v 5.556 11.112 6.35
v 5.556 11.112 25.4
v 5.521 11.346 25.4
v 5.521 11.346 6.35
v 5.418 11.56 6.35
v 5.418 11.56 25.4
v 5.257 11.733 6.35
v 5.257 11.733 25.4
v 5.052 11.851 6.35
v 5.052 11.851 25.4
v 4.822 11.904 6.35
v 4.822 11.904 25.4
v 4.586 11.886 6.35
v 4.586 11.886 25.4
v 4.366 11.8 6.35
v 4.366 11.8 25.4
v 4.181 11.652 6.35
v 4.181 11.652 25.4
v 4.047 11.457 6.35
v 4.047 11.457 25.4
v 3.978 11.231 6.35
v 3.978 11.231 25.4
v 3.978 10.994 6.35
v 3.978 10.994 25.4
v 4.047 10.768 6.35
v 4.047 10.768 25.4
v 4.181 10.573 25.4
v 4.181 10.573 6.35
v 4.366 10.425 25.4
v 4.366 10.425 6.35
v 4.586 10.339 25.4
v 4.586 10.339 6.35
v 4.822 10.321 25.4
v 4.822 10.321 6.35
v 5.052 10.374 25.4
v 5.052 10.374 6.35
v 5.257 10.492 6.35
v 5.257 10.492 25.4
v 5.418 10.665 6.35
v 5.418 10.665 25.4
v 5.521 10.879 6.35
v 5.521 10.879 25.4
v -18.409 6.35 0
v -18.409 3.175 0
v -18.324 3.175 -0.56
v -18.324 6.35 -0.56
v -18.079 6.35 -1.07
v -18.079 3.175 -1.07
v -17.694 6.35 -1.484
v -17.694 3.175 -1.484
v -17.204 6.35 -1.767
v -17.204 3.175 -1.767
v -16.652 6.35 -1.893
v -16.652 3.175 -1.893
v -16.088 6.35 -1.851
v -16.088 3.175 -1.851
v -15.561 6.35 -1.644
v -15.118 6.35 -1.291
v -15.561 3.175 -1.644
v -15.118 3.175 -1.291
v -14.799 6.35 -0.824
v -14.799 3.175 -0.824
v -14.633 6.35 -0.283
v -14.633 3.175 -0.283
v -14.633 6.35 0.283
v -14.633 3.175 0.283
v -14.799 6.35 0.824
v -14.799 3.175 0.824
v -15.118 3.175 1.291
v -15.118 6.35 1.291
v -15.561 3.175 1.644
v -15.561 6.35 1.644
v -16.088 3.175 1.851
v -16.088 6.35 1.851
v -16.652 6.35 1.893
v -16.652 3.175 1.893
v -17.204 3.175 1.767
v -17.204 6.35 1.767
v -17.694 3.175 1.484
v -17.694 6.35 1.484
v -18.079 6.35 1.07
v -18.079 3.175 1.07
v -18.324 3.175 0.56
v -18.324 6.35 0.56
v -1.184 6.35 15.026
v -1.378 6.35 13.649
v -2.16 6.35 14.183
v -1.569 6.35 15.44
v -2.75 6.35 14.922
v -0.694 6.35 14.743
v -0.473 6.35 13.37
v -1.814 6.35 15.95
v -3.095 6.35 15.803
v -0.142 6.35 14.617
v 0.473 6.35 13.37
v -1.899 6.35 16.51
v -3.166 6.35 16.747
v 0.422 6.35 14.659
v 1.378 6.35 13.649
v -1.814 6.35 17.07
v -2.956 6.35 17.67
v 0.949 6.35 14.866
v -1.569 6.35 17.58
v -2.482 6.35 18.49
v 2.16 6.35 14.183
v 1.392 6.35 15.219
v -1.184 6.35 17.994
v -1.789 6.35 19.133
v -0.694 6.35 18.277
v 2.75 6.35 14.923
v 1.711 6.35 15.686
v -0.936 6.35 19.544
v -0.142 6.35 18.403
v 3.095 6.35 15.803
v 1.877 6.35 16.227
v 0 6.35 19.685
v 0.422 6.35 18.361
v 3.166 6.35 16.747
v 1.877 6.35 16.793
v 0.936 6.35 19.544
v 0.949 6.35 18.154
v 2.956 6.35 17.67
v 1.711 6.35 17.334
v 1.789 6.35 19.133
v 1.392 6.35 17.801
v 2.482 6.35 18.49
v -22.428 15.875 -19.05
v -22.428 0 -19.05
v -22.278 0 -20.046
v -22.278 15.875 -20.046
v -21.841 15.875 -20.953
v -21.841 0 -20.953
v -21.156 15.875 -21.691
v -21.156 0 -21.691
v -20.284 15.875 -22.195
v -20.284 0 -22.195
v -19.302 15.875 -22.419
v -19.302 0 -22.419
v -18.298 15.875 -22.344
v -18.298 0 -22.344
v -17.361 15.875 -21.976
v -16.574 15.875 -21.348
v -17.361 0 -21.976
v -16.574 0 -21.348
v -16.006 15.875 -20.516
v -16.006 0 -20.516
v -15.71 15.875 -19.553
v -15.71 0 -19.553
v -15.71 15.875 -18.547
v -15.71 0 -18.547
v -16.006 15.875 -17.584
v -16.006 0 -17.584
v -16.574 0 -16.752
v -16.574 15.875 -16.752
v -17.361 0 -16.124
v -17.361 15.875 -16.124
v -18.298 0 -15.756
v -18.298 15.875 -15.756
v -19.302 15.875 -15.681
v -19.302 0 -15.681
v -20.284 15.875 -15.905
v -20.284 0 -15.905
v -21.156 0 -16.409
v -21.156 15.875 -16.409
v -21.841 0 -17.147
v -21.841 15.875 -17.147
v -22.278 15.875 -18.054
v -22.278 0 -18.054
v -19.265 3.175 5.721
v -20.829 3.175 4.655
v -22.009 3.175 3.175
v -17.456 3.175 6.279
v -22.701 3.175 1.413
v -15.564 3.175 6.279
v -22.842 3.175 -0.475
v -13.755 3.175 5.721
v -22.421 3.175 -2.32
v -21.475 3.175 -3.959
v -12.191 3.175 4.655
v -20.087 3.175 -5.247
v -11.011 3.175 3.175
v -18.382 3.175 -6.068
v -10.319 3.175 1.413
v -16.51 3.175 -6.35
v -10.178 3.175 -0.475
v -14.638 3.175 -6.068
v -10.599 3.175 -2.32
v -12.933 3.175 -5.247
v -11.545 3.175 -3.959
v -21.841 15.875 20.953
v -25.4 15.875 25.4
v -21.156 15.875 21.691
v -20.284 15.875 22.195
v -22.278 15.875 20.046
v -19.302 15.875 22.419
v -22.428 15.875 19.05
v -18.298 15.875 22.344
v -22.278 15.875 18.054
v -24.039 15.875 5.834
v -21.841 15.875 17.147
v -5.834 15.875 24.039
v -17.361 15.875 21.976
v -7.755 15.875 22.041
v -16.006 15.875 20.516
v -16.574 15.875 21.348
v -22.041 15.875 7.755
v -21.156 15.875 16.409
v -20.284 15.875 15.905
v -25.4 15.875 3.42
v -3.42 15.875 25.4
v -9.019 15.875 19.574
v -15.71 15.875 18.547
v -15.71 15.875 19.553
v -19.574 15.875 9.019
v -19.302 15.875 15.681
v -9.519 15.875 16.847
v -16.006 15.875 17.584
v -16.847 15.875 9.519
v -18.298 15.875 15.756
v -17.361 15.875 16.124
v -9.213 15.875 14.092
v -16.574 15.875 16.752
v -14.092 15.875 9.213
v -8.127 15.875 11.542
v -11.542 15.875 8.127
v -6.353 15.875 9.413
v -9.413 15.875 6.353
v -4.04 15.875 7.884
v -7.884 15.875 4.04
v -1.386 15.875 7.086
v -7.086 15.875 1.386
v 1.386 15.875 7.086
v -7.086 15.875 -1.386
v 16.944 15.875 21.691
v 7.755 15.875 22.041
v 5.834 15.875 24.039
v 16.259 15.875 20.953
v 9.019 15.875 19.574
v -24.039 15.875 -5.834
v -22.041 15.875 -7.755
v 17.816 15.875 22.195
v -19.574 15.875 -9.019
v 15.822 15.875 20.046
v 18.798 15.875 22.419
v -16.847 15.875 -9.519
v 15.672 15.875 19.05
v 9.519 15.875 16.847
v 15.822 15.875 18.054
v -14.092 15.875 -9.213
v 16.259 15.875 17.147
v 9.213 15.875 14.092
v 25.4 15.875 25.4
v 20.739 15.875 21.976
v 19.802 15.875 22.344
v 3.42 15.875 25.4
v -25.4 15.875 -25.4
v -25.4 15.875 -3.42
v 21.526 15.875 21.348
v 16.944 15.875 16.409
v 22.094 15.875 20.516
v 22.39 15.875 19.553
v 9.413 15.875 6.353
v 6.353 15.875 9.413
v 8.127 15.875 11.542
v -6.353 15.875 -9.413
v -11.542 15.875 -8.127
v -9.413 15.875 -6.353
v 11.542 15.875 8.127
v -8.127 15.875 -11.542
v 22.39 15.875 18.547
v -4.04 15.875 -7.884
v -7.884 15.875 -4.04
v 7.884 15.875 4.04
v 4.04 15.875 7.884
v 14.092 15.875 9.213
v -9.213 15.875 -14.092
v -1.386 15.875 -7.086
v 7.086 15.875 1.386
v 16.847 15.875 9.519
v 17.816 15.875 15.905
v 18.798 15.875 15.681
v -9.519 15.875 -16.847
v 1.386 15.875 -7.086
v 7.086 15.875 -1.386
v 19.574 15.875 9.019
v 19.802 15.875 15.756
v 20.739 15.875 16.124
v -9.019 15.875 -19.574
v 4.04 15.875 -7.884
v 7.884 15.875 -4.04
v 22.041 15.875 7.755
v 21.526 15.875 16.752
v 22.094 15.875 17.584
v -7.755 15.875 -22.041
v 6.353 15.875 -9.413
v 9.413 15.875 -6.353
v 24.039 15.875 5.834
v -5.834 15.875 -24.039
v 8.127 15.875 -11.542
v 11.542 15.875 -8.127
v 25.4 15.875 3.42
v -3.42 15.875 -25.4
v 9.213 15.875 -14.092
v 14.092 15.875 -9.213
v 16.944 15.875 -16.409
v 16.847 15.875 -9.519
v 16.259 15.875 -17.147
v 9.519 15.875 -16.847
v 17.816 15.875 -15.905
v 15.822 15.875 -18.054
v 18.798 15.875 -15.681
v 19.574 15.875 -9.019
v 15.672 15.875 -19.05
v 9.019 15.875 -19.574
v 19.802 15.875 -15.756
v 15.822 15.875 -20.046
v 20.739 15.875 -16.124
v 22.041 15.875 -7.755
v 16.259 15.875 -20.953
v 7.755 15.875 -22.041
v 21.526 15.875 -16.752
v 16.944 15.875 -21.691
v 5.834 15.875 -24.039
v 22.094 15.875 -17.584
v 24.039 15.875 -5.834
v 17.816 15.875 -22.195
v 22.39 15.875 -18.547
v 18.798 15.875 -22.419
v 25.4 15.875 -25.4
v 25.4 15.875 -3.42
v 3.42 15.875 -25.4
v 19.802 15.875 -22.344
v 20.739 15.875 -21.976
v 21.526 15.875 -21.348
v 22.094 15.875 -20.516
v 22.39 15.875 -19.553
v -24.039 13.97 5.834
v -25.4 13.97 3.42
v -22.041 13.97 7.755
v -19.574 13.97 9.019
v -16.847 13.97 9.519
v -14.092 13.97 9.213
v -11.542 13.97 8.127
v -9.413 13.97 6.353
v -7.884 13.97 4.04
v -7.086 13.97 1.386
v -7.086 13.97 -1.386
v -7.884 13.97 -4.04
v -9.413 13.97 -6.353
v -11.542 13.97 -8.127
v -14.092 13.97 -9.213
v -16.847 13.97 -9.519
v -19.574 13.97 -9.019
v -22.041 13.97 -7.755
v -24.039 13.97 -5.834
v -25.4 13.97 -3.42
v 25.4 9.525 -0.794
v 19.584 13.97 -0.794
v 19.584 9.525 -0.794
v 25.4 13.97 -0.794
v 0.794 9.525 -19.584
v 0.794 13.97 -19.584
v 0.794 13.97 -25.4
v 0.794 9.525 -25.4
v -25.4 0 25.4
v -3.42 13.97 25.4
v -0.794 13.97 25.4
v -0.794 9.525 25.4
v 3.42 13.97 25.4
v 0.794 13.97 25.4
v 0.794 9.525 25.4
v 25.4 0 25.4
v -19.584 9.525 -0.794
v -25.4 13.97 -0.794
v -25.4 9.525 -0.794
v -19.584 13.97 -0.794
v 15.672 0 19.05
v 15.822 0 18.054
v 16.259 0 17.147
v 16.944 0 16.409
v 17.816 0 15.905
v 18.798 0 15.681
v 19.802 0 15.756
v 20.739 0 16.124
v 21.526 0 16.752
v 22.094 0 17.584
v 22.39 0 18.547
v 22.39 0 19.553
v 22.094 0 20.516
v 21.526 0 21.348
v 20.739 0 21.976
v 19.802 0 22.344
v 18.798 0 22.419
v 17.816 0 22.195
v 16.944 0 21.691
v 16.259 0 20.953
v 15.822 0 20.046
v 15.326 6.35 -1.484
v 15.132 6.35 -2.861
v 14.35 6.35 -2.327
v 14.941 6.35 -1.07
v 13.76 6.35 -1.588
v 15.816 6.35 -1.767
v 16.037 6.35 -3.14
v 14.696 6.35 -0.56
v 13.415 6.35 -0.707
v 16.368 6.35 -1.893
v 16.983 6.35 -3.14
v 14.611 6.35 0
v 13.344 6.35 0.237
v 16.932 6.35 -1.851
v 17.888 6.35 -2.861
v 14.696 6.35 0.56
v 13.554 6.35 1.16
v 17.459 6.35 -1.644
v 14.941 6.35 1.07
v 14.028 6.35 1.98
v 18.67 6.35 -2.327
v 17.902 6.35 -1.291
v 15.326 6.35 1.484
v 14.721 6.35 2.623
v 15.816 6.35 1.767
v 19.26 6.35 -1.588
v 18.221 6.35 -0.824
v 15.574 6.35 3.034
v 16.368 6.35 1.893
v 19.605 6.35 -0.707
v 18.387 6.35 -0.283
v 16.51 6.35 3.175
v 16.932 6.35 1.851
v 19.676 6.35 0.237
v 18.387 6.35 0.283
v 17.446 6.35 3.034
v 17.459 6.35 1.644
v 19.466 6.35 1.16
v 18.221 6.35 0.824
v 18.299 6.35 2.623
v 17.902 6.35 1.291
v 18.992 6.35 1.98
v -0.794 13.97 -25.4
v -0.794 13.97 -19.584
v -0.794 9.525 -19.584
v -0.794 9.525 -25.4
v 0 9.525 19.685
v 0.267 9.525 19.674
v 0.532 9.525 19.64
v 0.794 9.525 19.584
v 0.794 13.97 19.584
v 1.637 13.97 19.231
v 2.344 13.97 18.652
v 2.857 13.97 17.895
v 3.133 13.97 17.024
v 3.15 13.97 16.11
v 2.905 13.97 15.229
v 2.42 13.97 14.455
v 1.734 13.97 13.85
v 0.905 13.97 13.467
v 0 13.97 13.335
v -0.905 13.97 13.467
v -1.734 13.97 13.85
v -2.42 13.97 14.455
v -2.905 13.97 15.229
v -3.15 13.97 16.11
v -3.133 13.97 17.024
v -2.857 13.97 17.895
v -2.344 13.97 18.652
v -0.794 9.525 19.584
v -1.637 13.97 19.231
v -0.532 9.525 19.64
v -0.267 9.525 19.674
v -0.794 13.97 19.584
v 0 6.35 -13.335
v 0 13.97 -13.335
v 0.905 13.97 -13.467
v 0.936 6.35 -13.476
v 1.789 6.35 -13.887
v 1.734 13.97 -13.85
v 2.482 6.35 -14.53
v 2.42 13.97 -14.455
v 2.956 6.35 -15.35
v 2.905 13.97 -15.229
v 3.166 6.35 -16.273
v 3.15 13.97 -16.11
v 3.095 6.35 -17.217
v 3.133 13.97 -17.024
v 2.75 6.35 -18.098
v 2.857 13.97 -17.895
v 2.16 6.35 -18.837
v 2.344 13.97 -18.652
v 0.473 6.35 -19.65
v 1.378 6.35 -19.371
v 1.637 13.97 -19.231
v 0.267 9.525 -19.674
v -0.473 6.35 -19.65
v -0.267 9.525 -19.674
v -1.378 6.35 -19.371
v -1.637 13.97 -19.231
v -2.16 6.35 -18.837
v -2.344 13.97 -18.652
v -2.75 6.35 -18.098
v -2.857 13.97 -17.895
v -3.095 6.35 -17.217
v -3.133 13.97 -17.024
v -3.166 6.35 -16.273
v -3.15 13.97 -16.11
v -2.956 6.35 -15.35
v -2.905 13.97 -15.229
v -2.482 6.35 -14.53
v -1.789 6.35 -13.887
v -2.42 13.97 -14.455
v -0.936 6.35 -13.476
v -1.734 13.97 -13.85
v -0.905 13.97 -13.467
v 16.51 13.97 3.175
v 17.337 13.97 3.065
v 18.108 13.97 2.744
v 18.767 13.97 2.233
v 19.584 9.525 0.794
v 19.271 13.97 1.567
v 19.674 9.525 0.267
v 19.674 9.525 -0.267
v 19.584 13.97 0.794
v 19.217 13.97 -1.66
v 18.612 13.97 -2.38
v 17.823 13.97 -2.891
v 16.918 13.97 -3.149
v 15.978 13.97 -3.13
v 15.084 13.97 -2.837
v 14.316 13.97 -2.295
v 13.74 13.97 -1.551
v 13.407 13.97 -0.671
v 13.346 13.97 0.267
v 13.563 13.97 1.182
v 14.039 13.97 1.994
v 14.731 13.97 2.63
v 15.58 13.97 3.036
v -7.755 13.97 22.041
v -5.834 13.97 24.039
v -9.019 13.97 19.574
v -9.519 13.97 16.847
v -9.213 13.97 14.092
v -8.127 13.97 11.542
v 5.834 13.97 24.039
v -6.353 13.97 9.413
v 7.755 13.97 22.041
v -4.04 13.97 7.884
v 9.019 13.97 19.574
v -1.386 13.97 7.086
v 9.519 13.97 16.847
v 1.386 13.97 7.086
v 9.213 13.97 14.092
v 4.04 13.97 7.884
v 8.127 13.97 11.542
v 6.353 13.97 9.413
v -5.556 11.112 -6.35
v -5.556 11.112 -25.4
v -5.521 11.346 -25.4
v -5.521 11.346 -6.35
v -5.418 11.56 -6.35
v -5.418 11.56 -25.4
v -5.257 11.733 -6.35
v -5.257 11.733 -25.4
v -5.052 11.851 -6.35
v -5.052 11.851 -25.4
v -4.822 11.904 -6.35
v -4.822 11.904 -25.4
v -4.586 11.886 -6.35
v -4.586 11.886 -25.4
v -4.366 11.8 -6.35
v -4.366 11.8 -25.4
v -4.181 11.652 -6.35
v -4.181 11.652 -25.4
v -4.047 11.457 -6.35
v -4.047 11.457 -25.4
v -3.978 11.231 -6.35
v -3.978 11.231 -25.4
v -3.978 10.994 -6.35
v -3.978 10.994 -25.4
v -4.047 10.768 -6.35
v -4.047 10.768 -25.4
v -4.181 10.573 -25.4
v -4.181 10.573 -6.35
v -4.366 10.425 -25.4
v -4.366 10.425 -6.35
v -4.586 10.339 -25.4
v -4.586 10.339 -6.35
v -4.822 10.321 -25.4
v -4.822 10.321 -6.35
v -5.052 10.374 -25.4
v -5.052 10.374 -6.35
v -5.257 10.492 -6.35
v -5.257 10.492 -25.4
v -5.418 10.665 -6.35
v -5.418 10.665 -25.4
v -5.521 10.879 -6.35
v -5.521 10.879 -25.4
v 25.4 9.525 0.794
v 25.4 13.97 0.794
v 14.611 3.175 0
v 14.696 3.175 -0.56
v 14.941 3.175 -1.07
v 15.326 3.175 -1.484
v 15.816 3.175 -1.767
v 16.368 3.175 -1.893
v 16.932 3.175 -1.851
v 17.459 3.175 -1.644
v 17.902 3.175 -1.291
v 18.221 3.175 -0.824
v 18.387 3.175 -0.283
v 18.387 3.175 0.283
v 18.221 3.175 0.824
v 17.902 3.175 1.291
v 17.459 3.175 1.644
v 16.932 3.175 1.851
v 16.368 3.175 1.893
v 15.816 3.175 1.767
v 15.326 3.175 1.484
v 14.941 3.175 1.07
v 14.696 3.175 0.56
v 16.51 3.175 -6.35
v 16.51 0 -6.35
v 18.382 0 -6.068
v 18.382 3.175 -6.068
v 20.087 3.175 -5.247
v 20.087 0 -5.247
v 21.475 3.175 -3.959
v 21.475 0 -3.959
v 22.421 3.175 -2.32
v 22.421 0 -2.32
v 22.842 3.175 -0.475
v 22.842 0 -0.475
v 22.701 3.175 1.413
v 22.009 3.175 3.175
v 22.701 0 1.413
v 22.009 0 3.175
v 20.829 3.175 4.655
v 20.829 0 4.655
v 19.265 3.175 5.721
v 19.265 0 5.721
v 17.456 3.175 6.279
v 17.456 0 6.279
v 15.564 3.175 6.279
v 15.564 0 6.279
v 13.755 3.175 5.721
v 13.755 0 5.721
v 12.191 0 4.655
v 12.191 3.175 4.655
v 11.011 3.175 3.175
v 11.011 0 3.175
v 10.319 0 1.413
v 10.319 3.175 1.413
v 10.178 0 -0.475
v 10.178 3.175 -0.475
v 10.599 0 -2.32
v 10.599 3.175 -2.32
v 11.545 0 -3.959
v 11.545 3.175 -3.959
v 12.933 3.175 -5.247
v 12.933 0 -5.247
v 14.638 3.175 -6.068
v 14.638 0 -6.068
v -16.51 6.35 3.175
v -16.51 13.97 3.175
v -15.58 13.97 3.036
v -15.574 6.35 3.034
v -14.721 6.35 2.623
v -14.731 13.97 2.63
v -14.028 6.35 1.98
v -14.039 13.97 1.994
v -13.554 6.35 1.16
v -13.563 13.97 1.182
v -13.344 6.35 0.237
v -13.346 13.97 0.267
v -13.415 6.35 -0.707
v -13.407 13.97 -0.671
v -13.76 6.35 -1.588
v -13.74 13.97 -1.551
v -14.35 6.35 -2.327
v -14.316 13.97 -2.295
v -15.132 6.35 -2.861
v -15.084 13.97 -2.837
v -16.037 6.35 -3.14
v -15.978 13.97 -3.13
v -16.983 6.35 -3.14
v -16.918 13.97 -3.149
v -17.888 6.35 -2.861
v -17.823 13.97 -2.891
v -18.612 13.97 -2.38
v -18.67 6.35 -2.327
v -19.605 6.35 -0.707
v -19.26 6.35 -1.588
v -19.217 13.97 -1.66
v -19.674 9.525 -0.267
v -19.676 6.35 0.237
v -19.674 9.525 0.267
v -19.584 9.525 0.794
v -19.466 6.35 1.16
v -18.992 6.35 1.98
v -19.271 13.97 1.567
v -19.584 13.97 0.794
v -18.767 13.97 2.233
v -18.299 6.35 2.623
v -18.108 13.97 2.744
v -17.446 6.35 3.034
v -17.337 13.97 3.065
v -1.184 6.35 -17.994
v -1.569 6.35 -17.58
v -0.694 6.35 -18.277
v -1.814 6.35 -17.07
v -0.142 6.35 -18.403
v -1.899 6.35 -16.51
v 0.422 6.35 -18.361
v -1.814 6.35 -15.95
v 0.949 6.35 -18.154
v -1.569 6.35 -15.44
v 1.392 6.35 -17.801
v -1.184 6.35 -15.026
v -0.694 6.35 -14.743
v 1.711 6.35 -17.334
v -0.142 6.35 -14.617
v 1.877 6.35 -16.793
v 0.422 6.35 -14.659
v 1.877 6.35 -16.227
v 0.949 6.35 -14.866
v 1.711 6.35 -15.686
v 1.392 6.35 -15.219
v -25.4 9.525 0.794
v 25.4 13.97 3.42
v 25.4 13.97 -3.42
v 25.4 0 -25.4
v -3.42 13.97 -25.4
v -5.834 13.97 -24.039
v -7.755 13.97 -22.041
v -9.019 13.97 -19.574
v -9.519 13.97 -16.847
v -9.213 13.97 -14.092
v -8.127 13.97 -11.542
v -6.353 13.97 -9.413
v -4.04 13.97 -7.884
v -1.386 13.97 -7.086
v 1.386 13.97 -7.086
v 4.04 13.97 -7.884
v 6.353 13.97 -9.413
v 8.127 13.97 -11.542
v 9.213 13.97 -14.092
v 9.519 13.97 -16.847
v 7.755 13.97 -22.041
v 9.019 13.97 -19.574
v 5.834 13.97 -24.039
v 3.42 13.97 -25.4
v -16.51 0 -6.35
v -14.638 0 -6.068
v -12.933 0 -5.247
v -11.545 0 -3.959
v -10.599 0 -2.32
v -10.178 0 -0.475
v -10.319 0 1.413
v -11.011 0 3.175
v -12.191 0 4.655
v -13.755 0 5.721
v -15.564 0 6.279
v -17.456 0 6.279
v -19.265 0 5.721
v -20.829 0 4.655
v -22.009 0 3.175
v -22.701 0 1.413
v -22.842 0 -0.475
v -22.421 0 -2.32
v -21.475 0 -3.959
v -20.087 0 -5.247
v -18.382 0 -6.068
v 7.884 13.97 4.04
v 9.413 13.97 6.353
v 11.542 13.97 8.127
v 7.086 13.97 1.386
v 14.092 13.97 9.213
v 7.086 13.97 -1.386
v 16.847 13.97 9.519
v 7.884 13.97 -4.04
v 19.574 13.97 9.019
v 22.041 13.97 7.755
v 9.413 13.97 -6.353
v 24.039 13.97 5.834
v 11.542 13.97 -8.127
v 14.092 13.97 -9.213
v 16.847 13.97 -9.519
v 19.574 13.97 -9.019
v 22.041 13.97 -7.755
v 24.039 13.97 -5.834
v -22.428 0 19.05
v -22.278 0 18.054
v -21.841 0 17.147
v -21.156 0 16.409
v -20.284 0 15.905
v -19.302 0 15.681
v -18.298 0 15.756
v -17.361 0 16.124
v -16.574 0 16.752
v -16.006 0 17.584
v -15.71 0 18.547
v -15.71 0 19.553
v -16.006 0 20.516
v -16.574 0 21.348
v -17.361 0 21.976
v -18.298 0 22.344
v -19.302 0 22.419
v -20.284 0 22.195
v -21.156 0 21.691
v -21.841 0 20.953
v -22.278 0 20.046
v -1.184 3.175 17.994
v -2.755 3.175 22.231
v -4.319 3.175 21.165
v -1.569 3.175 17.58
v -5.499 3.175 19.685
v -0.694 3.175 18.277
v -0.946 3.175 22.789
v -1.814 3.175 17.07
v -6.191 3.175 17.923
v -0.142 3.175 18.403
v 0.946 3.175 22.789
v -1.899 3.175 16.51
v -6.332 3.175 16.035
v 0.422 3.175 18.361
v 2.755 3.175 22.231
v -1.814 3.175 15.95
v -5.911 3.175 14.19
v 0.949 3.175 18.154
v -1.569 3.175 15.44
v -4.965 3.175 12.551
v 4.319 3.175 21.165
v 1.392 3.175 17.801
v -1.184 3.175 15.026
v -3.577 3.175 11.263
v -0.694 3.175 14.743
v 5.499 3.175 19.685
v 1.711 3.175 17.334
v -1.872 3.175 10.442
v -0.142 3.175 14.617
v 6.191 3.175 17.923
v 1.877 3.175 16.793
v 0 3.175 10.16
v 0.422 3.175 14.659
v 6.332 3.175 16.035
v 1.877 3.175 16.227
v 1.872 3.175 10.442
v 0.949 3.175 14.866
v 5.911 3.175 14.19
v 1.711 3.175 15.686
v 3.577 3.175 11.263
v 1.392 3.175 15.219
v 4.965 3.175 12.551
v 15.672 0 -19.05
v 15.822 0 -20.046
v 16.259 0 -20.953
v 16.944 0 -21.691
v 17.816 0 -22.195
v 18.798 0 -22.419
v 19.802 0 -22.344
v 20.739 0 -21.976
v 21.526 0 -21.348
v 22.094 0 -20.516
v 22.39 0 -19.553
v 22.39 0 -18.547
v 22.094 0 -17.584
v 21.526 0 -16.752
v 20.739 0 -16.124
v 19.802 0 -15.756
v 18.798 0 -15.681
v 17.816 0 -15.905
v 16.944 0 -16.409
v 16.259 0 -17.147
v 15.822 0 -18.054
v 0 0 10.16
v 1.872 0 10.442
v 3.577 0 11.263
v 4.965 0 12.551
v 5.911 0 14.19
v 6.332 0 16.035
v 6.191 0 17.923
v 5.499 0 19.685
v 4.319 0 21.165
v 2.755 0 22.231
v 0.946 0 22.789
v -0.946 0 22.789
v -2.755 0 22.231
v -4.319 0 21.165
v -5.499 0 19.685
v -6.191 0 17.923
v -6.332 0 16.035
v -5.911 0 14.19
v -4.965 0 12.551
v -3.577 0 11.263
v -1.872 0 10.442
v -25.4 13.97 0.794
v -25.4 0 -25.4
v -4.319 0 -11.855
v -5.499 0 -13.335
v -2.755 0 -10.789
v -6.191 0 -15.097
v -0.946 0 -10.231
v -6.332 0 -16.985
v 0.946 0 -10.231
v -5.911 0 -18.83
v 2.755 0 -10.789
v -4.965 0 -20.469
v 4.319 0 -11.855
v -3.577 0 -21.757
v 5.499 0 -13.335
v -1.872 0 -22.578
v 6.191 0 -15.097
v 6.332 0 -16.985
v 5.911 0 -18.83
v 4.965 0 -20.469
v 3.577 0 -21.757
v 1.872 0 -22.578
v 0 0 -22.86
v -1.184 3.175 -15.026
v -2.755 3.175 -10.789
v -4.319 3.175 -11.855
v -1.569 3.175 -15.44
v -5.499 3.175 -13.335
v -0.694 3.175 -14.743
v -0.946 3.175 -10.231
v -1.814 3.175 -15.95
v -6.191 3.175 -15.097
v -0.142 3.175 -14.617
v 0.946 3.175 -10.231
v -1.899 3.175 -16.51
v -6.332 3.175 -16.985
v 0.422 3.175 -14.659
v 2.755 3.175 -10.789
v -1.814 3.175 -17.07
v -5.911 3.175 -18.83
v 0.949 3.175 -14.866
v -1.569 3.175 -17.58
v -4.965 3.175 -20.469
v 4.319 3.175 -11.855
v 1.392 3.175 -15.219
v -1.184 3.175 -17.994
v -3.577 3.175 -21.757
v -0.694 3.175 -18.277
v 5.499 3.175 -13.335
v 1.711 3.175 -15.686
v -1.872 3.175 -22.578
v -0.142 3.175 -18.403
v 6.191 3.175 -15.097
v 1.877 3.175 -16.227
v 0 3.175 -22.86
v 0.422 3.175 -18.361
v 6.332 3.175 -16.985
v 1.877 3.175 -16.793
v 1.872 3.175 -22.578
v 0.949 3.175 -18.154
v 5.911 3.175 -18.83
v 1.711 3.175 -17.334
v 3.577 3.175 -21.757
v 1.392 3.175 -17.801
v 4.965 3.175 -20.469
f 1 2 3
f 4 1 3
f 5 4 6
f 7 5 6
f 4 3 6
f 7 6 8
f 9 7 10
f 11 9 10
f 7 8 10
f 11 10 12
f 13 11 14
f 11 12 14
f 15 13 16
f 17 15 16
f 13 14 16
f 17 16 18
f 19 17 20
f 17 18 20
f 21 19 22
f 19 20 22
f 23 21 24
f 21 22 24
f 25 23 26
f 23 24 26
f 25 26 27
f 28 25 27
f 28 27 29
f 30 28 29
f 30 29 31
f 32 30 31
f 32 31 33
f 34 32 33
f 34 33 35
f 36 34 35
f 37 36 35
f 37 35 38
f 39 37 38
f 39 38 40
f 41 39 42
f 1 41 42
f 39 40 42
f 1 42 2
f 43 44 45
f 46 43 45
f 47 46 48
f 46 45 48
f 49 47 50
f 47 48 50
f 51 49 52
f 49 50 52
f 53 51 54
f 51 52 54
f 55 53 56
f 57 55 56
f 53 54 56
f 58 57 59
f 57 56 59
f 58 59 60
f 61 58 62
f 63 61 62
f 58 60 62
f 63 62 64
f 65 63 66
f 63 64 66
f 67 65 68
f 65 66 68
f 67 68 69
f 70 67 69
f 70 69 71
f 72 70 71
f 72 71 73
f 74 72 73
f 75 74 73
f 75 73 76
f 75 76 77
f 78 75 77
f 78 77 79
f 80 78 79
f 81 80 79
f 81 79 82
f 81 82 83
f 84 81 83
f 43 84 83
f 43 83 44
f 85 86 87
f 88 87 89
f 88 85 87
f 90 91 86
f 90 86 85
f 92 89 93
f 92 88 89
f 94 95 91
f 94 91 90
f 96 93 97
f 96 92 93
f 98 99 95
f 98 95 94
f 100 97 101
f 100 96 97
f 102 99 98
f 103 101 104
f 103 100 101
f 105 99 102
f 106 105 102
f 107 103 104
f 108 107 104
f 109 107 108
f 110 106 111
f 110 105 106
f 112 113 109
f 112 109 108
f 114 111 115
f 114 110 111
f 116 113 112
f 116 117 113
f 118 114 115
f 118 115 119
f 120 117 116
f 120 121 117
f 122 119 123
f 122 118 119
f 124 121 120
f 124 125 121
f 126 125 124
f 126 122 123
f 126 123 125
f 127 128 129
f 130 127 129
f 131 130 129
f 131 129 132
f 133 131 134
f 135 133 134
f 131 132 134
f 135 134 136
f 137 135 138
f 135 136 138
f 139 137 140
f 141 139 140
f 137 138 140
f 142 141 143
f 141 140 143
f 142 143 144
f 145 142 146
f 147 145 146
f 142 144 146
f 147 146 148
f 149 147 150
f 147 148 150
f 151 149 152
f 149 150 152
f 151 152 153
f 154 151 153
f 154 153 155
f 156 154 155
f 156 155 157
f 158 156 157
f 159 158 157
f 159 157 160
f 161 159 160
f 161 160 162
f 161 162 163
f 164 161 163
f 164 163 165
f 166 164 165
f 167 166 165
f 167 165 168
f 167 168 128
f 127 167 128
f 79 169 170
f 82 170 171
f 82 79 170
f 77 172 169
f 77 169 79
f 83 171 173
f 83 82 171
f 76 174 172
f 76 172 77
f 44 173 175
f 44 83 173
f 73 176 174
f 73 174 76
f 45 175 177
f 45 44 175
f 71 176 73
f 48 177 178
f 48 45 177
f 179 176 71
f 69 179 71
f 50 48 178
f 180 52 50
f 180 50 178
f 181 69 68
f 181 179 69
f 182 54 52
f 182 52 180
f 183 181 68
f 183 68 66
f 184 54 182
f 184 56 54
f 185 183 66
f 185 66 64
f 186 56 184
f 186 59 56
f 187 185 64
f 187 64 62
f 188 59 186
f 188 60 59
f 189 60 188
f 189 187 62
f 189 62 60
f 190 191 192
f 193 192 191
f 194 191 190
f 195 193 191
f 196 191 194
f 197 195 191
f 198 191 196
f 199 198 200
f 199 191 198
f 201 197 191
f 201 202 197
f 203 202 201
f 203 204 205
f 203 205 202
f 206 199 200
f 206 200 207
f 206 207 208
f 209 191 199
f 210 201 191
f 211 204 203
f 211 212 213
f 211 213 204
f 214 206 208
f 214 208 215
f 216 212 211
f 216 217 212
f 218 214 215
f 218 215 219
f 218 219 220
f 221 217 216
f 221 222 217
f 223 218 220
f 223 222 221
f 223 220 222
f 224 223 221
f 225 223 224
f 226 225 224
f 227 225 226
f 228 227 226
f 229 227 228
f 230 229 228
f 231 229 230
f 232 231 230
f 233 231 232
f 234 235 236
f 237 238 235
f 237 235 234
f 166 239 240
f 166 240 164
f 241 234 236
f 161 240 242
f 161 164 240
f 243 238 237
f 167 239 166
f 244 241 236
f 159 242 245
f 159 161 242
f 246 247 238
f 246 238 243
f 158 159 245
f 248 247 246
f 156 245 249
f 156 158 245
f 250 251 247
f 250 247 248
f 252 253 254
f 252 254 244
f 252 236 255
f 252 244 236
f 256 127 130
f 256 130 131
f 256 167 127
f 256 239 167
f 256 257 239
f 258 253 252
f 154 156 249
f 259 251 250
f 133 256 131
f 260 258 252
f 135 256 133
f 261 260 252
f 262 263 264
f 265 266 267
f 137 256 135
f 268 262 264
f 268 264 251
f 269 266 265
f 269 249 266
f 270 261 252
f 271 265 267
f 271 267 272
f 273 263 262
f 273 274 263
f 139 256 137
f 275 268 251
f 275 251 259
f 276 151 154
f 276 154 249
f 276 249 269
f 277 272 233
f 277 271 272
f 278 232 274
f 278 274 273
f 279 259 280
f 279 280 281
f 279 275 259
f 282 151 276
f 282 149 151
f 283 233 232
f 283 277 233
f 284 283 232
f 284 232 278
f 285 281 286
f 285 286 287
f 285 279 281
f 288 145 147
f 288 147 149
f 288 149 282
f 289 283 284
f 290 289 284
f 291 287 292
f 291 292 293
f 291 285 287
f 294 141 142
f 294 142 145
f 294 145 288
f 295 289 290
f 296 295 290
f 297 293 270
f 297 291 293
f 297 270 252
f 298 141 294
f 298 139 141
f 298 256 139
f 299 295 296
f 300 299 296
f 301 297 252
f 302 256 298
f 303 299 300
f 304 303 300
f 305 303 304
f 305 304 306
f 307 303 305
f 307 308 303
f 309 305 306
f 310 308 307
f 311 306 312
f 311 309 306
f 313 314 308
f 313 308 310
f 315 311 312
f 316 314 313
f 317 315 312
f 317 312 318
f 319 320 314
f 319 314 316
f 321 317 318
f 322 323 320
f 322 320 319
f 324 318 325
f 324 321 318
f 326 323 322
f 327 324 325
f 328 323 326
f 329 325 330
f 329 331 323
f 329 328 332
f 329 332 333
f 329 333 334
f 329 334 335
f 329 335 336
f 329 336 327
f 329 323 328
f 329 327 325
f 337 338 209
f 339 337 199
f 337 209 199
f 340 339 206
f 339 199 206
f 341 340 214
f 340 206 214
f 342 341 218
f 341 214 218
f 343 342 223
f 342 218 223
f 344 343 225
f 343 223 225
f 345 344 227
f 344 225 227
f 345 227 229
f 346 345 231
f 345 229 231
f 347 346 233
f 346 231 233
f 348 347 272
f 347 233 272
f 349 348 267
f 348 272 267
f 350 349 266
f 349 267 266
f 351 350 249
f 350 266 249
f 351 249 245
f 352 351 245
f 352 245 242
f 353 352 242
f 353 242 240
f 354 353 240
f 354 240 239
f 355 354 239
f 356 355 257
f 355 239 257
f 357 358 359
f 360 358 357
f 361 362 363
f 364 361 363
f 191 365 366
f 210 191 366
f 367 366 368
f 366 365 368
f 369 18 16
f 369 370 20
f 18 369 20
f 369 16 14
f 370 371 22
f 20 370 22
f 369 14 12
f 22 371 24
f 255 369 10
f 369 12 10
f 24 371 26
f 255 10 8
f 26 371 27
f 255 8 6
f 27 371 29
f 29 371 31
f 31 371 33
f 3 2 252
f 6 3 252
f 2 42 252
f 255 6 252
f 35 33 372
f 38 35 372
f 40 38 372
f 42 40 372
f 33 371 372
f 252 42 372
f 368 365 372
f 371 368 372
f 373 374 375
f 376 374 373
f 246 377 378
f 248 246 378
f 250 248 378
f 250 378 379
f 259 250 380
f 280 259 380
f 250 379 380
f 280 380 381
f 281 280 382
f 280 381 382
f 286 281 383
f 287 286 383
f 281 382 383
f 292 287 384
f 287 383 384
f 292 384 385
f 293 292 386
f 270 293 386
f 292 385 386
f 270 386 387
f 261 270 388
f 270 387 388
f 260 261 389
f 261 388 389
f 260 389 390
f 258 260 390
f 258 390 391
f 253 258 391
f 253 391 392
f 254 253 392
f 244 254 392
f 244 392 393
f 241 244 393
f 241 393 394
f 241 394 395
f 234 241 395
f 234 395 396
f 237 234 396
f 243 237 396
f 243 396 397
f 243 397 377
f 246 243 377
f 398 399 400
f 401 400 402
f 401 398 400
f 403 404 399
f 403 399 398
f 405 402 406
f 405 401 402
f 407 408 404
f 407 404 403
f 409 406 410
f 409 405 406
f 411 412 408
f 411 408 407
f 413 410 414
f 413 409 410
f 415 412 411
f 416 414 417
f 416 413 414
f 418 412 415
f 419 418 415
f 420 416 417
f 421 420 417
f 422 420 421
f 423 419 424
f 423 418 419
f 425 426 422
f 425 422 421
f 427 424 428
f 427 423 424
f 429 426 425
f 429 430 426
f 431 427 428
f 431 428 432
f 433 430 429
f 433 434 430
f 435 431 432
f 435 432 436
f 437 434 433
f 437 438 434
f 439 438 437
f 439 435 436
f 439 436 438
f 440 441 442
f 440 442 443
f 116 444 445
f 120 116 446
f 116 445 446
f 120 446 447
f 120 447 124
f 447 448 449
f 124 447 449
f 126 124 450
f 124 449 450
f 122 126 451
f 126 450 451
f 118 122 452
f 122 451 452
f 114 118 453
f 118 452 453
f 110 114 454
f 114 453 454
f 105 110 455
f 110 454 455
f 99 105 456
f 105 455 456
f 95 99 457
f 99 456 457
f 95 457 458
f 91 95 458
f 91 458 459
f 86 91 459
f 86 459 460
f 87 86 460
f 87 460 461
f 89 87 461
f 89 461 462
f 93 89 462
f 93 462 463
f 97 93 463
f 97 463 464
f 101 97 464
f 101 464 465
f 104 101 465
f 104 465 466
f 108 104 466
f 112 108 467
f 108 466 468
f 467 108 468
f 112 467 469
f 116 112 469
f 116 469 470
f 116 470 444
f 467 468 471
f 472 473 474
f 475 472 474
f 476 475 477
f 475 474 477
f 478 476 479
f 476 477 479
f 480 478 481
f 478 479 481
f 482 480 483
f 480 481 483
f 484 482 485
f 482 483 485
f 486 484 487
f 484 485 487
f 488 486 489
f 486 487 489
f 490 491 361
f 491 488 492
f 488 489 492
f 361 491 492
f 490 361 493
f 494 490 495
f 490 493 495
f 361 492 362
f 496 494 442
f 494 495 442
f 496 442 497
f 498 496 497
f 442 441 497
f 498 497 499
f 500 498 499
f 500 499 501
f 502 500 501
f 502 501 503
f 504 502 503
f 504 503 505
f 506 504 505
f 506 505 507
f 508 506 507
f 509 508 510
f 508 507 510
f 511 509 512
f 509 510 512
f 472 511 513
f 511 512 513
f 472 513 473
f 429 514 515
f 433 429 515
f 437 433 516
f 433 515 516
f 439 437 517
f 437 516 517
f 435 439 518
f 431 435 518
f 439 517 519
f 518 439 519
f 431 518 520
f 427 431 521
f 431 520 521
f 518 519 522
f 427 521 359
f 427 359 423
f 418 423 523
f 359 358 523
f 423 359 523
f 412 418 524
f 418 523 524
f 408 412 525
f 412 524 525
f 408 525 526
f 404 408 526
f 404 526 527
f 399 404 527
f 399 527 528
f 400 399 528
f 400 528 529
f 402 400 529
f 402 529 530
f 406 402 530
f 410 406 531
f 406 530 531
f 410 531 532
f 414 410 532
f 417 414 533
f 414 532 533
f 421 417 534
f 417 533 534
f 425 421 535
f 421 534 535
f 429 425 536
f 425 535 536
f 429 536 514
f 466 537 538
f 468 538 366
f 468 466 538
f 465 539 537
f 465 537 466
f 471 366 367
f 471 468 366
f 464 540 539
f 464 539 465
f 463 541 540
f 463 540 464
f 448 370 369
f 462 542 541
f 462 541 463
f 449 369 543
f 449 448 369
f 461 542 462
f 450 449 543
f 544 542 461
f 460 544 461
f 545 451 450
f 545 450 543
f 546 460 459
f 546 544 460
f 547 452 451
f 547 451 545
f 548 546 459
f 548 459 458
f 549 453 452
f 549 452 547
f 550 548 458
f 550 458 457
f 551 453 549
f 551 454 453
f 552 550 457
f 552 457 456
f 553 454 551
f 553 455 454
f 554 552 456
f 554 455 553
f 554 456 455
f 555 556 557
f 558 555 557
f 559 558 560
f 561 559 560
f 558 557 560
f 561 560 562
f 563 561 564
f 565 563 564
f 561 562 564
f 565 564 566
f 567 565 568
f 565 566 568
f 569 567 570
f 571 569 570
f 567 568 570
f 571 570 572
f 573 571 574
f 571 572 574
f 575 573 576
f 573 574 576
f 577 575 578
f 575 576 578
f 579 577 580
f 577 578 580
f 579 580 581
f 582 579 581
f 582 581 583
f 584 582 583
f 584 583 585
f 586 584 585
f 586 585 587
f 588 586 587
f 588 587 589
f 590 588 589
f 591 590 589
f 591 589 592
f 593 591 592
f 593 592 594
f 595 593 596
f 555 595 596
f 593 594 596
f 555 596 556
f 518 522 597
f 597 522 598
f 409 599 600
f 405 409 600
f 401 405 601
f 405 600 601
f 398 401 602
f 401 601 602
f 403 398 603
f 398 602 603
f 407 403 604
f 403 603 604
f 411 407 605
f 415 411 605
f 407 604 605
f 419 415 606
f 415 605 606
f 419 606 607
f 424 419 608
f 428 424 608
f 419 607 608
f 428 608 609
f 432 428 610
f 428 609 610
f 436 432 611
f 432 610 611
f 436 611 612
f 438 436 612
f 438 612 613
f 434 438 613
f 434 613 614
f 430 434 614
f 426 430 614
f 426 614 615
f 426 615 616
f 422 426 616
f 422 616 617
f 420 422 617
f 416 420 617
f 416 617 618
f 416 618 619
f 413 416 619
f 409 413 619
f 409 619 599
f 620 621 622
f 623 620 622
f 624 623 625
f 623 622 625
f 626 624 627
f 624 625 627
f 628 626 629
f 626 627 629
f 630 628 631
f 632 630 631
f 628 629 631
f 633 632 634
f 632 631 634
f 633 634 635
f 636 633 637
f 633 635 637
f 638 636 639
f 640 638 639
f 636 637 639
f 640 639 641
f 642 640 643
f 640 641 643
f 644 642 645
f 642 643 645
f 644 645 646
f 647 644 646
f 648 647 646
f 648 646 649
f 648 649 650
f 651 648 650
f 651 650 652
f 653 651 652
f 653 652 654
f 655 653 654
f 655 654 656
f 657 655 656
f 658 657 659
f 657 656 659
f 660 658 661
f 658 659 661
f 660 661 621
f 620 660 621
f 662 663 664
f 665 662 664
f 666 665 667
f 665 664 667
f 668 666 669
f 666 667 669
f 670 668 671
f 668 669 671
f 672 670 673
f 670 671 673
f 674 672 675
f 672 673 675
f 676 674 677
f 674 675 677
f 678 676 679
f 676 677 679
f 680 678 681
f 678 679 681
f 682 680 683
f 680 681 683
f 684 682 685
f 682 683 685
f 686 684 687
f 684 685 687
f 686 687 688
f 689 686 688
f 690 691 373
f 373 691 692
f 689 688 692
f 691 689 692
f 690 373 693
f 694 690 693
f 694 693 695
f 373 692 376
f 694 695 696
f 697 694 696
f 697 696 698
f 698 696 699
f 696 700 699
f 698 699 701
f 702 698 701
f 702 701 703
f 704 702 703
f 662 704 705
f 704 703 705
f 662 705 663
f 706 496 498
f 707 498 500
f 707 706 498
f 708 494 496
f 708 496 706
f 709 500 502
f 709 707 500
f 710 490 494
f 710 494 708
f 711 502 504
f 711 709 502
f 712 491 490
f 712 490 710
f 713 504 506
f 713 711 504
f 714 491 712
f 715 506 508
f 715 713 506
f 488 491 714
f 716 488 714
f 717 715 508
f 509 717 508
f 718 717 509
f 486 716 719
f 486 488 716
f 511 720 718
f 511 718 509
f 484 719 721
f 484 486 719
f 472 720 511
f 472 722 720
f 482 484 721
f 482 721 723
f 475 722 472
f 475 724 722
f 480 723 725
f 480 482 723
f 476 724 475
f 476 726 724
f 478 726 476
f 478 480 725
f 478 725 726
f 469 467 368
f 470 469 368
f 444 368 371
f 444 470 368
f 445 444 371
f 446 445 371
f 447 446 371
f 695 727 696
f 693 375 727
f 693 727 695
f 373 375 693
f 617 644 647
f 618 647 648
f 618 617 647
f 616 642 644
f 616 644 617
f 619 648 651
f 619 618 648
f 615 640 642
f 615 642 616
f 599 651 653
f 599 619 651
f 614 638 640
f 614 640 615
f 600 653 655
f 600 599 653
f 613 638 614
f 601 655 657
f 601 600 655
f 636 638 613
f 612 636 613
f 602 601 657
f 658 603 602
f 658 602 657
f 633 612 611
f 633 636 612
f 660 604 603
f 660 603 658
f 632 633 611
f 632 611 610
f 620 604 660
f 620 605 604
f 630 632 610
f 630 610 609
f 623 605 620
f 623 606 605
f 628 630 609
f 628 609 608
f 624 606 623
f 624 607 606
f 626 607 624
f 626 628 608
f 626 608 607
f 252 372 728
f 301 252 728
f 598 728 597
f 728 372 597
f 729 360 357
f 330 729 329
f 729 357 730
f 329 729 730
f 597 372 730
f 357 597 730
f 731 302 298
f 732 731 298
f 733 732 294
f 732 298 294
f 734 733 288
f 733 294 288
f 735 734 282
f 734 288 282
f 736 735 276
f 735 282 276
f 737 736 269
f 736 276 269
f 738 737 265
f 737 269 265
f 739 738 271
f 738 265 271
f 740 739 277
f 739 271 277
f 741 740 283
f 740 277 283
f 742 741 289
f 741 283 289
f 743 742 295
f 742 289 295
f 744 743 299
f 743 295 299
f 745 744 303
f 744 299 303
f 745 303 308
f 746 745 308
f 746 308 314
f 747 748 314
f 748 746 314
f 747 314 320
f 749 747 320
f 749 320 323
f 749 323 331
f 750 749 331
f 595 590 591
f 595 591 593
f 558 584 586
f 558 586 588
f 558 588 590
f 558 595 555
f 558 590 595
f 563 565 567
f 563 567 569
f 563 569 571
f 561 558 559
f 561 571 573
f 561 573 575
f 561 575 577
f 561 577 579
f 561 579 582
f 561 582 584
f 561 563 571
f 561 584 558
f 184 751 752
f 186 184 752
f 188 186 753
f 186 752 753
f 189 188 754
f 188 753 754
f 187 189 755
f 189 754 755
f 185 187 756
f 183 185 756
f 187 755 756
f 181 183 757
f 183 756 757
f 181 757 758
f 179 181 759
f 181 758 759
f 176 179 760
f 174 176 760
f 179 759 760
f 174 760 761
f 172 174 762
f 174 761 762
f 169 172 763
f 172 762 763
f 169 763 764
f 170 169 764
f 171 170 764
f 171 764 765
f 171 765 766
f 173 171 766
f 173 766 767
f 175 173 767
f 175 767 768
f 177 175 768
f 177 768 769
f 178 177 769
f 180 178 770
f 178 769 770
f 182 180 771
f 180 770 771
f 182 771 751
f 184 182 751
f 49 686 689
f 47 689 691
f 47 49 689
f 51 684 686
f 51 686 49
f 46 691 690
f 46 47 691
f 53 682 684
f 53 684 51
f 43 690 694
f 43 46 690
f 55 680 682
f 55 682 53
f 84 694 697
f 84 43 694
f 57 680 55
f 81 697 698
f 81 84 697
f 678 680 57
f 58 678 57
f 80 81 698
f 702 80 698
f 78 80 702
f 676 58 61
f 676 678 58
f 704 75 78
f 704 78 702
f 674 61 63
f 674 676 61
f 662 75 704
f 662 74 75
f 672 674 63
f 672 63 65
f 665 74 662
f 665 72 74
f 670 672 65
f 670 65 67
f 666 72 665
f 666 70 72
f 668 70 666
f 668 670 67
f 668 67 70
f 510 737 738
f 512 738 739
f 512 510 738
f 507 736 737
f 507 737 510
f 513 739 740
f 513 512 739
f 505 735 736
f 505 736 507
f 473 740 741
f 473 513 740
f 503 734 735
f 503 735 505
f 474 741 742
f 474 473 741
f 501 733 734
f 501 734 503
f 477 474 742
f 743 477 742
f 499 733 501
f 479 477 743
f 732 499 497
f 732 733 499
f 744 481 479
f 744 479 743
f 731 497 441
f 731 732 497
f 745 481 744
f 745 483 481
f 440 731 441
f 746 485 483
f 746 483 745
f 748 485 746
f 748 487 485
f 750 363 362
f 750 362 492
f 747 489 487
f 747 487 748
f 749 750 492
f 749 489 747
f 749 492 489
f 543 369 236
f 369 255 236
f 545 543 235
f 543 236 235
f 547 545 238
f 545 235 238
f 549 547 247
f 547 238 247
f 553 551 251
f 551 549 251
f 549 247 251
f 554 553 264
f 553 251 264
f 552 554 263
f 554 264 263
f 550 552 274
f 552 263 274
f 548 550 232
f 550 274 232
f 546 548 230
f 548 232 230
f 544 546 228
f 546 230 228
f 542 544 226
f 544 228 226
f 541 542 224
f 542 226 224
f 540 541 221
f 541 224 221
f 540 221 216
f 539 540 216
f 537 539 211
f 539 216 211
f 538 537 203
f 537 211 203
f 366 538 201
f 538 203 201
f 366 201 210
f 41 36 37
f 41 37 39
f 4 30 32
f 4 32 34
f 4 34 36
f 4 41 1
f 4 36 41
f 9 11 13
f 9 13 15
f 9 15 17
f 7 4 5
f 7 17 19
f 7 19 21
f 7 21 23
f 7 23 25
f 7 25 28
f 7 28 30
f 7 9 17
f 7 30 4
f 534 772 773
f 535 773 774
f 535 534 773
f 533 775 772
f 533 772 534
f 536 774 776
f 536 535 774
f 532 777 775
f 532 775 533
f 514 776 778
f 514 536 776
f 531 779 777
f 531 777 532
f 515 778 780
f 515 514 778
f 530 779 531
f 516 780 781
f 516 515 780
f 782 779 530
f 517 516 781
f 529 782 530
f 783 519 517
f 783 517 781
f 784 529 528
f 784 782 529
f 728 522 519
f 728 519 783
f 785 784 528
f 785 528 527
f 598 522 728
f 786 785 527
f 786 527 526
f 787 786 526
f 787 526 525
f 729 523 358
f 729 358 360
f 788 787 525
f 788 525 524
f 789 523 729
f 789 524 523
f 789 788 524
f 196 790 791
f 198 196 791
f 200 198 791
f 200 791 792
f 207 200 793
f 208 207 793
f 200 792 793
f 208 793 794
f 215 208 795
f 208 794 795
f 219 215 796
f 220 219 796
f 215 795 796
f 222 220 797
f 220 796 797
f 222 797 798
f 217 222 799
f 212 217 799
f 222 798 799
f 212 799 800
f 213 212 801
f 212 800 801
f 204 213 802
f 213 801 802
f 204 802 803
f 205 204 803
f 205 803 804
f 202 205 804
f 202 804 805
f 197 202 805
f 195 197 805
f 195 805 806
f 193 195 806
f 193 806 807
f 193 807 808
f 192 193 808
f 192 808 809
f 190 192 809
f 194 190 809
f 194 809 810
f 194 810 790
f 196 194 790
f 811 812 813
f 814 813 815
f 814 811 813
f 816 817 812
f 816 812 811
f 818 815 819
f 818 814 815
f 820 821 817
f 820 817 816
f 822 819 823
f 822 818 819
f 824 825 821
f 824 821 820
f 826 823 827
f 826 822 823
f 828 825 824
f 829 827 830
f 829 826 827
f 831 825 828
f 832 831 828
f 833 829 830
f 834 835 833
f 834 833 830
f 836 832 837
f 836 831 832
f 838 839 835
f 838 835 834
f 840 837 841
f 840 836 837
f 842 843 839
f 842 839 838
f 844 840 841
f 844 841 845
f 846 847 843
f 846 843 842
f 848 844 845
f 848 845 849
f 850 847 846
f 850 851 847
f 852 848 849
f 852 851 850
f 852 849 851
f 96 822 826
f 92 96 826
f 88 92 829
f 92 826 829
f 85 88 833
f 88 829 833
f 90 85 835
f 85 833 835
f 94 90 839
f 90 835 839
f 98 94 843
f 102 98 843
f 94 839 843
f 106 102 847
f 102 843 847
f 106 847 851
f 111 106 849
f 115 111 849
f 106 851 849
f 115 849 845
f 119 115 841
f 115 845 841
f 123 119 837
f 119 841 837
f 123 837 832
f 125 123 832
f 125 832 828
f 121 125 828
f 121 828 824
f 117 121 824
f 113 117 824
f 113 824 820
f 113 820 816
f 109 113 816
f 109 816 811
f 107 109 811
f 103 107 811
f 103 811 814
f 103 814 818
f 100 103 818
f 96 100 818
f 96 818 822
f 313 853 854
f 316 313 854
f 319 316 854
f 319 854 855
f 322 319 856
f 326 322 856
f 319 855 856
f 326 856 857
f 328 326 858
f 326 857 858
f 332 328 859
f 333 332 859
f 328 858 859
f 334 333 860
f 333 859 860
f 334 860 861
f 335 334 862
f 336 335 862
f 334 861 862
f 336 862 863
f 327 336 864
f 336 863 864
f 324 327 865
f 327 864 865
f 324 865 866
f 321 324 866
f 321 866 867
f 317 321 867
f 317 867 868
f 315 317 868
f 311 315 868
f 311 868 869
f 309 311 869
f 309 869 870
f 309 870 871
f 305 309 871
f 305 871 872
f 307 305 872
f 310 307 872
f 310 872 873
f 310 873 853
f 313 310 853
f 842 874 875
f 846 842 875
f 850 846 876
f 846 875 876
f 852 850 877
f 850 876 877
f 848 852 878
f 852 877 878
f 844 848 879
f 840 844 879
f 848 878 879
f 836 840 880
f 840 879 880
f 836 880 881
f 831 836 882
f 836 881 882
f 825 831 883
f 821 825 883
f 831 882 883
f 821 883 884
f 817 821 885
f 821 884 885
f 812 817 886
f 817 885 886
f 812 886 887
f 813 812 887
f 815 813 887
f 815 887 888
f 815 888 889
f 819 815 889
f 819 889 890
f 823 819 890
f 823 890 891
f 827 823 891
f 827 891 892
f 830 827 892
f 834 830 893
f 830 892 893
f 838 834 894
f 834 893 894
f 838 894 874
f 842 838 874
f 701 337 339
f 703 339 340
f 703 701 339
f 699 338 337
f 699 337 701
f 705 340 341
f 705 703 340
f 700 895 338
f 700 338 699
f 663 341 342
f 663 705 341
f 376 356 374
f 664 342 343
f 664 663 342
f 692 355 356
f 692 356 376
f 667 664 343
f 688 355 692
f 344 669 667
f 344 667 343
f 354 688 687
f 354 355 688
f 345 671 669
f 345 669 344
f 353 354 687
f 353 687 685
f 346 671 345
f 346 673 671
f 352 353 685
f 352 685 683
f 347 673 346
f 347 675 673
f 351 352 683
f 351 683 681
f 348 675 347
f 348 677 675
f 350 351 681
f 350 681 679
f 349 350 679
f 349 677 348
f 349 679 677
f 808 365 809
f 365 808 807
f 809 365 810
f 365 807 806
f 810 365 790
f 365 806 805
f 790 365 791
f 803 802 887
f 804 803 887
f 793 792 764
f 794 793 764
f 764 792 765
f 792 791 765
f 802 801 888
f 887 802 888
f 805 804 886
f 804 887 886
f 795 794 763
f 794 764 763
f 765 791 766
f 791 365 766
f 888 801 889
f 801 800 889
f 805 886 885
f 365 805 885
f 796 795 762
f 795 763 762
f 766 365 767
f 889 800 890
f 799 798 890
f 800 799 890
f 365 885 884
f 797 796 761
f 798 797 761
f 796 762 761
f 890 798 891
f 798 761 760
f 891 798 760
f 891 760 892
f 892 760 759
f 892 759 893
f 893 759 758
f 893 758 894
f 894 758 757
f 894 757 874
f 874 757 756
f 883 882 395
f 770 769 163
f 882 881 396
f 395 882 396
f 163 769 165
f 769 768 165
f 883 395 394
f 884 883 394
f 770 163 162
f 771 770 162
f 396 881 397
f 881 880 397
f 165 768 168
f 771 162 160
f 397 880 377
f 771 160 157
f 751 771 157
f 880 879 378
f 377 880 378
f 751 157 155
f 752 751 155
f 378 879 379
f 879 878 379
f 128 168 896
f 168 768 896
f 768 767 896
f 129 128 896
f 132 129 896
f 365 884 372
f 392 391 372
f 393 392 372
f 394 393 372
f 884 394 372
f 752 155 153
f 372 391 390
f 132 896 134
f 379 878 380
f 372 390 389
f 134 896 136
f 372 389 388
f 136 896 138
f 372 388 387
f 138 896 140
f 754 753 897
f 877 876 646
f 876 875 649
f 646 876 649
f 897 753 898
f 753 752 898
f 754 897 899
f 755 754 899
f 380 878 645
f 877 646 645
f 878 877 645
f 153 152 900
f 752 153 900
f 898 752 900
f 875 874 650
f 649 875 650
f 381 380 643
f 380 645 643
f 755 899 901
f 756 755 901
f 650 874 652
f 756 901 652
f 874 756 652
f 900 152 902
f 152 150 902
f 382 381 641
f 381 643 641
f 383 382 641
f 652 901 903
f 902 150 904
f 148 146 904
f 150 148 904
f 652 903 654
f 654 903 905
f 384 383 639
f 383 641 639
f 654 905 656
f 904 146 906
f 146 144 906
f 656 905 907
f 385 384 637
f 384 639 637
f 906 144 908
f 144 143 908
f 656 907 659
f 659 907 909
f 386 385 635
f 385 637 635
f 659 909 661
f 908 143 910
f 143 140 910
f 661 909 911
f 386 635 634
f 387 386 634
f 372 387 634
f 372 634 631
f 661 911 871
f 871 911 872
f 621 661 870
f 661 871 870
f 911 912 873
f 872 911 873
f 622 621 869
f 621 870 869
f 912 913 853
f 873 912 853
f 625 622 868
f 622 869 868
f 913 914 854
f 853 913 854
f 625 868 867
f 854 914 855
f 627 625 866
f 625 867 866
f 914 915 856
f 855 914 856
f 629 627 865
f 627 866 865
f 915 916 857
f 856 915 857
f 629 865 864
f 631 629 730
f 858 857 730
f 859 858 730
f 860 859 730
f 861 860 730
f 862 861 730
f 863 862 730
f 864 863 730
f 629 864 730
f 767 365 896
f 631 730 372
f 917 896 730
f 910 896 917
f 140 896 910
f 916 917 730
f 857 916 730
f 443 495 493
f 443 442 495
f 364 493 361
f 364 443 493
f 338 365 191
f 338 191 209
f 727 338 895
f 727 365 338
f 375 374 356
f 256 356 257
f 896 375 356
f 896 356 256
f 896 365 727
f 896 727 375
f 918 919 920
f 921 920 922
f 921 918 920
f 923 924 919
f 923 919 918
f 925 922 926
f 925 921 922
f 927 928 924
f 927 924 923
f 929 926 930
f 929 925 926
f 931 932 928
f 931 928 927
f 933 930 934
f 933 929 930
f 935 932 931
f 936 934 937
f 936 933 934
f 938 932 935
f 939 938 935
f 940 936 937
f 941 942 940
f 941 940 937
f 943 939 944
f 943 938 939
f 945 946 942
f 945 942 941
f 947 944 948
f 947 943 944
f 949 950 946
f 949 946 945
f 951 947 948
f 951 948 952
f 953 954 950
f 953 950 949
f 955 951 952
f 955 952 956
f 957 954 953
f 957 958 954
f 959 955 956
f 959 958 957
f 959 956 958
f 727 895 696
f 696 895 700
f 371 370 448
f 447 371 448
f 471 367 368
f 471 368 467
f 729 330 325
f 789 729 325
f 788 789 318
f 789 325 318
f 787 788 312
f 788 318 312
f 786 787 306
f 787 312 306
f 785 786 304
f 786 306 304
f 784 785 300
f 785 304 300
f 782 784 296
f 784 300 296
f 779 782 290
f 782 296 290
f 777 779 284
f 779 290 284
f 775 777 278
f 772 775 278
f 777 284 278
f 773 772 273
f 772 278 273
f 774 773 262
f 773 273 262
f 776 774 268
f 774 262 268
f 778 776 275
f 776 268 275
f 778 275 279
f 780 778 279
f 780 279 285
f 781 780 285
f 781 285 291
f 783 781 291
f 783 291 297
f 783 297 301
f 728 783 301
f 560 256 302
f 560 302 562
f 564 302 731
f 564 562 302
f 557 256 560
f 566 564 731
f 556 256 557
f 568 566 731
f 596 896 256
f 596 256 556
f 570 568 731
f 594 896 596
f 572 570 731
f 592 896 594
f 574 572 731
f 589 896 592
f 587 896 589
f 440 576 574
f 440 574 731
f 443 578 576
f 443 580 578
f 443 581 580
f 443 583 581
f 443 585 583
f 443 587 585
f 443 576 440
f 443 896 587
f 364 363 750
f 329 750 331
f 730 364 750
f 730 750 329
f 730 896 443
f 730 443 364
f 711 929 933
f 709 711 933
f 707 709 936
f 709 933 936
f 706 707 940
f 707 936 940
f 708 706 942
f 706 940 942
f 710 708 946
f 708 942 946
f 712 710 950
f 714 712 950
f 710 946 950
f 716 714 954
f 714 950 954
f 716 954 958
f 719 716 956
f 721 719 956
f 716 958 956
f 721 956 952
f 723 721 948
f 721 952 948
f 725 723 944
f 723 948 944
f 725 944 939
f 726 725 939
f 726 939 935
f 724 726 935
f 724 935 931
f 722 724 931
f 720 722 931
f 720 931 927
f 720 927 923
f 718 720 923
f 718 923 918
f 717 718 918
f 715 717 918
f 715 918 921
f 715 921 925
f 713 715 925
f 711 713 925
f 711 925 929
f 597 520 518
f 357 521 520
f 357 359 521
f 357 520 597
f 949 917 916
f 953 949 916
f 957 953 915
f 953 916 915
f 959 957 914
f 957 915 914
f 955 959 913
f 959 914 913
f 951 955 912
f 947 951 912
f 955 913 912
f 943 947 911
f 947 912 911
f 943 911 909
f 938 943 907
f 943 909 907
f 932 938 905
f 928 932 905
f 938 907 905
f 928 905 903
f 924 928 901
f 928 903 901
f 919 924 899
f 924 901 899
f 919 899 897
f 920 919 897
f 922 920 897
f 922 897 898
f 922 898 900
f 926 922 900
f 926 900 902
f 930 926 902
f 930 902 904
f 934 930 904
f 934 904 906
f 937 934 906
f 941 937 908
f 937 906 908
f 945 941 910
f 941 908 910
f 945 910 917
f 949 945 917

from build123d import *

# Parameters (mm, degrees)
SKETCH1_W               = 50.8
SKETCH1_H               = 50.8
BOSS_EXTRUDE1_DEPTH     = 15.875
F_1_4_CLEARANCE_HOLE1_D = 6.7564
SKETCH7_R               = 3.175
CUT_EXTRUDE2_DEPTH      = 9.525
F_6_CLEARANCE_HOLE1_D   = 3.7973
SKETCH15_R              = 6.35
CUT_EXTRUDE5_DEPTH      = 3.175
SKETCH17_R              = 0.79375
CUT_EXTRUDE7_DEPTH      = 19.05
SKETCH19_R              = 0.79375
CUT_EXTRUDE8_DEPTH      = 19.05
SKETCH20_W              = 1.5875
SKETCH20_H              = 8.919384601
SKETCH20_W_2            = 8.609080127
SKETCH20_H_2            = 1.5875
SKETCH20_W_3            = 9.022819426
SKETCH20_H_3            = 8.367732203
CUT_EXTRUDE9_DEPTH      = 6.35
SKETCH21_R              = 9.525
CUT_EXTRUDE10_DEPTH     = 1.905


with BuildPart() as part:
    # Sketch1 → Boss-Extrude1 (new body)
    with BuildSketch(Plane(origin=(0, 0, 0), x_dir=(1, 0, 0), z_dir=(0, 1, 0))):
        Rectangle(SKETCH1_W, SKETCH1_H)
    extrude(amount=BOSS_EXTRUDE1_DEPTH)

    # 1/4 Clearance Hole1 (through all)
    with Locations(Plane(origin=(0, 15.875, 0), x_dir=(1, 0, 0), z_dir=(0, 1, 0))):
        with Locations((-19.05, -19.05), (-19.05, 19.05), (19.05, 19.05), (19.05, -19.05)):
            Hole(F_1_4_CLEARANCE_HOLE1_D / 2)

    # Sketch7 → Cut-Extrude2 (cut)
    with BuildSketch(Plane(origin=(0, 15.875, 0), x_dir=(1, 0, 0), z_dir=(0, 1, 0))):
        with Locations(Location((-16.51, 0, 0), (0, 0, 270))):
            Circle(SKETCH7_R)
        with Locations(Location((0, 16.51, 0), (0, 0, 270))):
            Circle(SKETCH7_R)
        with Locations(Location((16.51, 0, 0), (0, 0, 270))):
            Circle(SKETCH7_R)
        with Locations(Location((0, -16.51, 0), (0, 0, 270))):
            Circle(SKETCH7_R)
    extrude(amount=-CUT_EXTRUDE2_DEPTH, mode=Mode.SUBTRACT)

    # #6 Clearance Hole1 (through all)
    with Locations(Plane(origin=(0, 6.35, 0), x_dir=(1, 0, 0), z_dir=(0, 1, 0))):
        with Locations((-16.51, 0), (0, 16.51), (16.51, 0), (0, -16.51)):
            Hole(F_6_CLEARANCE_HOLE1_D / 2)

    # Sketch15 → Cut-Extrude5 (cut)
    with BuildSketch(Plane.XZ):
        with Locations(Location((0, 16.51, 0), (0, 0, 270))):
            Circle(SKETCH15_R)
        with Locations(Location((16.51, 0, 0), (0, 0, 270))):
            Circle(SKETCH15_R)
        with Locations(Location((0, -16.51, 0), (0, 0, 270))):
            Circle(SKETCH15_R)
        with Locations(Location((-16.51, 0, 0), (0, 0, 270))):
            Circle(SKETCH15_R)
    extrude(amount=-CUT_EXTRUDE5_DEPTH, mode=Mode.SUBTRACT)

    # Sketch17 → Cut-Extrude7 (cut)
    with BuildSketch(Plane.XY.offset(25.4)):
        with Locations((4.7625, 11.1125)):
            Circle(SKETCH17_R)
    extrude(amount=-CUT_EXTRUDE7_DEPTH, mode=Mode.SUBTRACT)

    # Sketch19 → Cut-Extrude8 (cut)
    with BuildSketch(Plane(origin=(0, 0, -25.4), x_dir=(-1, 0, 0), z_dir=(0, 0, -1))):
        with Locations((4.7625, 11.1125)):
            Circle(SKETCH19_R)
    extrude(amount=-CUT_EXTRUDE8_DEPTH, mode=Mode.SUBTRACT)

    # Sketch20 → Cut-Extrude9 (cut)
    with BuildSketch(Plane(origin=(0, 15.875, 0), x_dir=(1, 0, 0), z_dir=(0, 1, 0))):
        with Locations((0, 20.9403077)):
            Rectangle(SKETCH20_W, SKETCH20_H)
        with Locations((-21.095459936, 0)):
            Rectangle(SKETCH20_W_2, SKETCH20_H_2)
        with Locations((20.888590287, 0)):
            Rectangle(SKETCH20_W_3, SKETCH20_H_2)
        with Locations((0, -21.216133899)):
            Rectangle(SKETCH20_W, SKETCH20_H_3)
    extrude(amount=-CUT_EXTRUDE9_DEPTH, mode=Mode.SUBTRACT)

    # Sketch21 → Cut-Extrude10 (cut)
    with BuildSketch(Plane(origin=(0, 15.875, 0), x_dir=(1, 0, 0), z_dir=(0, 1, 0))):
        with Locations((-16.51, 0)):
            Circle(SKETCH21_R)
        with Locations((16.51, 0)):
            Circle(SKETCH21_R)
        with Locations((0, 16.51)):
            Circle(SKETCH21_R)
        with Locations((0, -16.51)):
            Circle(SKETCH21_R)
    extrude(amount=-CUT_EXTRUDE10_DEPTH, mode=Mode.SUBTRACT)


solid = part.part
